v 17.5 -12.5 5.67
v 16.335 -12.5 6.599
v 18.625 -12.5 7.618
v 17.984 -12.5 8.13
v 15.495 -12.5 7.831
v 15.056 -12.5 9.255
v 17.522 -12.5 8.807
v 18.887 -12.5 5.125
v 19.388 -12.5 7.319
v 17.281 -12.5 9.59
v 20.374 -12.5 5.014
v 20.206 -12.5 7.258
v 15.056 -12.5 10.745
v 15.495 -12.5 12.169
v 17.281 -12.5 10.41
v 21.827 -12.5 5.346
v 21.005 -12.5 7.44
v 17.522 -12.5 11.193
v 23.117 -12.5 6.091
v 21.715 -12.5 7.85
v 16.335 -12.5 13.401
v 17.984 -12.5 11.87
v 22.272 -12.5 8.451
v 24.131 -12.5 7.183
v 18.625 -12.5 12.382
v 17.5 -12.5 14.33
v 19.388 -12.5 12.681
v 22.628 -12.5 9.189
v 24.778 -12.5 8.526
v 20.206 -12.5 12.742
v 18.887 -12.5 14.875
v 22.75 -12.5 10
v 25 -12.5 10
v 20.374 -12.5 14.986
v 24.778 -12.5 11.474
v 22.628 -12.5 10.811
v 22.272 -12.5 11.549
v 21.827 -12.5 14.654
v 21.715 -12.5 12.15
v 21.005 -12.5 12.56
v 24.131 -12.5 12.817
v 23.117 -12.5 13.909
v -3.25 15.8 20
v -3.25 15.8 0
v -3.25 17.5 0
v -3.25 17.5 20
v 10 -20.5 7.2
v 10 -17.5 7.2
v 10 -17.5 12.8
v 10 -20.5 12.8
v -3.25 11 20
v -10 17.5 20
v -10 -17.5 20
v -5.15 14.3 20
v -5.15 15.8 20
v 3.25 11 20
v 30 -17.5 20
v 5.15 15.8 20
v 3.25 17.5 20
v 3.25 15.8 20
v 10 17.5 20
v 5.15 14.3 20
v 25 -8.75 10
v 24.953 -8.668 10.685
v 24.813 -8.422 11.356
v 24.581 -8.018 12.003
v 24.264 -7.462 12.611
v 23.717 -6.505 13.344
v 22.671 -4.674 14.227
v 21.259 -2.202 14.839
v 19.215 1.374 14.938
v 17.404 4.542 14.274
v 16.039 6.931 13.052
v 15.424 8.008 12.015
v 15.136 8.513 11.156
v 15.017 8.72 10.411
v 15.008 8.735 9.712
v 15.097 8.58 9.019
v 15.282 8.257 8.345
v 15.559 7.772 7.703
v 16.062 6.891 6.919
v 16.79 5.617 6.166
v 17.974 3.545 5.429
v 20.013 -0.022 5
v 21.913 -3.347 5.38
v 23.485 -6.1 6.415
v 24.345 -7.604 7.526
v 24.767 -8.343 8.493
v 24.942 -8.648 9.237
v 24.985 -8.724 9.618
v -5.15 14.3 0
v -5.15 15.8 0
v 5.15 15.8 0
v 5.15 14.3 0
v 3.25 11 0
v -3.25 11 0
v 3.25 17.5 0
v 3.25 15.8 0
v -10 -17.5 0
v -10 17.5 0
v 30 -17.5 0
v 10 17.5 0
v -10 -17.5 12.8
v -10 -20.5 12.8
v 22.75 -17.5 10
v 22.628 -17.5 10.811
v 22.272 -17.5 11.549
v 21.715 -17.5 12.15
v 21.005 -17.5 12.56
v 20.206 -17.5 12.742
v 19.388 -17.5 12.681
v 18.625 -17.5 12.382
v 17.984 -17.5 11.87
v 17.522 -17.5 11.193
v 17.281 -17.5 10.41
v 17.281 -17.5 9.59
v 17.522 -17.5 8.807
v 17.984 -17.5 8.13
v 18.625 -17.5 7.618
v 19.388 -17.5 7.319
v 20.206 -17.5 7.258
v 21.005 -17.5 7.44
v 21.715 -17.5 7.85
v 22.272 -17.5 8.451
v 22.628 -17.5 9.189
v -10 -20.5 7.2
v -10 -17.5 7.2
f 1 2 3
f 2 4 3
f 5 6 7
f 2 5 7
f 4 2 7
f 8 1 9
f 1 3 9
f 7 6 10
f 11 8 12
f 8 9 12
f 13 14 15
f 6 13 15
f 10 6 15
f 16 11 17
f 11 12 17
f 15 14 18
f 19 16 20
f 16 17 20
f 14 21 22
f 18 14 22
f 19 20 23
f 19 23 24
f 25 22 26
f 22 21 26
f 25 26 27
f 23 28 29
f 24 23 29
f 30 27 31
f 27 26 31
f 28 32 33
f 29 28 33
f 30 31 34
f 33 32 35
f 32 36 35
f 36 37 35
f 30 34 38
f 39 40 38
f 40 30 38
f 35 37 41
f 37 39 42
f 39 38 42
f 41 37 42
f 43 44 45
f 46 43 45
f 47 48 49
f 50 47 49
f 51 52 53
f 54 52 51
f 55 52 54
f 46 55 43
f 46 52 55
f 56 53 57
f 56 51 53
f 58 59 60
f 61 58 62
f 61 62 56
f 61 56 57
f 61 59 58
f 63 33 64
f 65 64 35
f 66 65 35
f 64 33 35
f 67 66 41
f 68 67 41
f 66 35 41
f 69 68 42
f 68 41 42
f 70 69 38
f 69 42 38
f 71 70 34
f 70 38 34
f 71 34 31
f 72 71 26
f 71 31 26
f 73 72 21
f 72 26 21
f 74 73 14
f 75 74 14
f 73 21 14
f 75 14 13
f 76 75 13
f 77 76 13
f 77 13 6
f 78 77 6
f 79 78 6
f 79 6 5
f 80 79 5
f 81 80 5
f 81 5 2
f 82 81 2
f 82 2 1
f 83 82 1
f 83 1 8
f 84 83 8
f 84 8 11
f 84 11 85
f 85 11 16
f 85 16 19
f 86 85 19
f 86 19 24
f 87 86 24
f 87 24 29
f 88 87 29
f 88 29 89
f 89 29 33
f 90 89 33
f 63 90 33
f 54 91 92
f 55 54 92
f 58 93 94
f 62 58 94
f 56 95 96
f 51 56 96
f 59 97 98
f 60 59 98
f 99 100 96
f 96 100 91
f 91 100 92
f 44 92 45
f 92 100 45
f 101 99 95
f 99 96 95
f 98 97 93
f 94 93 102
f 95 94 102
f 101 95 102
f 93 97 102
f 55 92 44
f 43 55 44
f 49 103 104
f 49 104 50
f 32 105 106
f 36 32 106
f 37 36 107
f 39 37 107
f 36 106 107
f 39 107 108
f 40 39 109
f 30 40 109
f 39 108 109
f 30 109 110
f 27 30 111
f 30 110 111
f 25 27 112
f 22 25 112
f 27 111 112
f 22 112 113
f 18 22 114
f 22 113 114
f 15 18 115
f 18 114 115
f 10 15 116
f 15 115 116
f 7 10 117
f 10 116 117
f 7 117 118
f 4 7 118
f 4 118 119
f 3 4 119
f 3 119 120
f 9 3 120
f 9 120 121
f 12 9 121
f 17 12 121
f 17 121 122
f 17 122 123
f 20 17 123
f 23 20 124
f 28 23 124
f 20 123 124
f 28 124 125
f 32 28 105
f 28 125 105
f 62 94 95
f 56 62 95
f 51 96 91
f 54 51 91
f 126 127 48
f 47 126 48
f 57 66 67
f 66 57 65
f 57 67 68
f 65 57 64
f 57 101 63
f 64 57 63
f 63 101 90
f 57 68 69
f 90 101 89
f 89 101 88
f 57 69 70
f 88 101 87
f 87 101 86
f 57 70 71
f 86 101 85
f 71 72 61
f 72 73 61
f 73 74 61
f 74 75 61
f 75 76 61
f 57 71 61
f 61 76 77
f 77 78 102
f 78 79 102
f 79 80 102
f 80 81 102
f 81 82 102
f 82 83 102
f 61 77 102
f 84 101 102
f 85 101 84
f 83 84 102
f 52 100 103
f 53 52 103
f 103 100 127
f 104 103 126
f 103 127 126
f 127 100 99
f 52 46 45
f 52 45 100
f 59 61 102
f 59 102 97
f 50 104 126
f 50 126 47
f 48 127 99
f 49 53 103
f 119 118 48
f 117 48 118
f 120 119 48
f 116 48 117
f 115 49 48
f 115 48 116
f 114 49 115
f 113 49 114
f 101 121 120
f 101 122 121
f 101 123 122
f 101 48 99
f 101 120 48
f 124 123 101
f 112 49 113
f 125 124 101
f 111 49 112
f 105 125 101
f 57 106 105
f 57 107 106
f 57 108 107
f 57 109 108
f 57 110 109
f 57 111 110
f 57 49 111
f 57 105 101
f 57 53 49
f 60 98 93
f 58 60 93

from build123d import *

# Parameters (mm, degrees)
F1_DEPTH = 20
F2_R     = 2.75
F3_DEPTH = 25
F2_R_2   = 5
F4_DEPTH = 28.4
F5_DEPTH = 5
F2_W     = 20
F2_H     = 5.6
F6_DEPTH = 3


with BuildPart() as f1:
    # F0 (on Top) → F1 (new body)
    with BuildSketch(Plane.XY):
        Polygon((-3.25, 17.5), (-10, 17.5), (-10, -17.5), (10, -17.5), (10, 17.5), (3.25, 17.5), (3.25, 15.8), (5.15, 15.8), (5.15, 14.3), (3.25, 11), (-3.25, 11), (-5.15, 14.3), (-5.15, 15.8), (-3.25, 15.8), align=None)
        Polygon((10, 17.5), (10, -17.5), (30, -17.5), align=None)
    extrude(amount=F1_DEPTH)

    # F2 (on face) → F3 (cut)
    with BuildSketch(Plane.XZ.offset(17.5)):
        with Locations((20, 10)):
            Circle(F2_R)
    extrude(amount=-F3_DEPTH, mode=Mode.SUBTRACT)

    # F2 (on face) → F4 (cut)
    with BuildSketch(Plane.XZ.offset(17.5)):
        with Locations((20, 10)):
            Circle(F2_R_2)
        with Locations((20, 10)):
            Circle(F2_R, mode=Mode.SUBTRACT)
    extrude(amount=-F4_DEPTH, mode=Mode.SUBTRACT)

    # F2 (on face) → F5 (join)
    with BuildSketch(Plane.XZ.offset(17.5)):
        with Locations((20, 10)):
            Circle(F2_R_2)
        with Locations((20, 10)):
            Circle(F2_R, mode=Mode.SUBTRACT)
    extrude(amount=-F5_DEPTH)

    # F2 (on face) → F6 (join)
    with BuildSketch(Plane.XZ.offset(17.5)):
        with Locations((0, 10)):
            Rectangle(F2_W, F2_H)
    extrude(amount=F6_DEPTH)


solid = f1.part
